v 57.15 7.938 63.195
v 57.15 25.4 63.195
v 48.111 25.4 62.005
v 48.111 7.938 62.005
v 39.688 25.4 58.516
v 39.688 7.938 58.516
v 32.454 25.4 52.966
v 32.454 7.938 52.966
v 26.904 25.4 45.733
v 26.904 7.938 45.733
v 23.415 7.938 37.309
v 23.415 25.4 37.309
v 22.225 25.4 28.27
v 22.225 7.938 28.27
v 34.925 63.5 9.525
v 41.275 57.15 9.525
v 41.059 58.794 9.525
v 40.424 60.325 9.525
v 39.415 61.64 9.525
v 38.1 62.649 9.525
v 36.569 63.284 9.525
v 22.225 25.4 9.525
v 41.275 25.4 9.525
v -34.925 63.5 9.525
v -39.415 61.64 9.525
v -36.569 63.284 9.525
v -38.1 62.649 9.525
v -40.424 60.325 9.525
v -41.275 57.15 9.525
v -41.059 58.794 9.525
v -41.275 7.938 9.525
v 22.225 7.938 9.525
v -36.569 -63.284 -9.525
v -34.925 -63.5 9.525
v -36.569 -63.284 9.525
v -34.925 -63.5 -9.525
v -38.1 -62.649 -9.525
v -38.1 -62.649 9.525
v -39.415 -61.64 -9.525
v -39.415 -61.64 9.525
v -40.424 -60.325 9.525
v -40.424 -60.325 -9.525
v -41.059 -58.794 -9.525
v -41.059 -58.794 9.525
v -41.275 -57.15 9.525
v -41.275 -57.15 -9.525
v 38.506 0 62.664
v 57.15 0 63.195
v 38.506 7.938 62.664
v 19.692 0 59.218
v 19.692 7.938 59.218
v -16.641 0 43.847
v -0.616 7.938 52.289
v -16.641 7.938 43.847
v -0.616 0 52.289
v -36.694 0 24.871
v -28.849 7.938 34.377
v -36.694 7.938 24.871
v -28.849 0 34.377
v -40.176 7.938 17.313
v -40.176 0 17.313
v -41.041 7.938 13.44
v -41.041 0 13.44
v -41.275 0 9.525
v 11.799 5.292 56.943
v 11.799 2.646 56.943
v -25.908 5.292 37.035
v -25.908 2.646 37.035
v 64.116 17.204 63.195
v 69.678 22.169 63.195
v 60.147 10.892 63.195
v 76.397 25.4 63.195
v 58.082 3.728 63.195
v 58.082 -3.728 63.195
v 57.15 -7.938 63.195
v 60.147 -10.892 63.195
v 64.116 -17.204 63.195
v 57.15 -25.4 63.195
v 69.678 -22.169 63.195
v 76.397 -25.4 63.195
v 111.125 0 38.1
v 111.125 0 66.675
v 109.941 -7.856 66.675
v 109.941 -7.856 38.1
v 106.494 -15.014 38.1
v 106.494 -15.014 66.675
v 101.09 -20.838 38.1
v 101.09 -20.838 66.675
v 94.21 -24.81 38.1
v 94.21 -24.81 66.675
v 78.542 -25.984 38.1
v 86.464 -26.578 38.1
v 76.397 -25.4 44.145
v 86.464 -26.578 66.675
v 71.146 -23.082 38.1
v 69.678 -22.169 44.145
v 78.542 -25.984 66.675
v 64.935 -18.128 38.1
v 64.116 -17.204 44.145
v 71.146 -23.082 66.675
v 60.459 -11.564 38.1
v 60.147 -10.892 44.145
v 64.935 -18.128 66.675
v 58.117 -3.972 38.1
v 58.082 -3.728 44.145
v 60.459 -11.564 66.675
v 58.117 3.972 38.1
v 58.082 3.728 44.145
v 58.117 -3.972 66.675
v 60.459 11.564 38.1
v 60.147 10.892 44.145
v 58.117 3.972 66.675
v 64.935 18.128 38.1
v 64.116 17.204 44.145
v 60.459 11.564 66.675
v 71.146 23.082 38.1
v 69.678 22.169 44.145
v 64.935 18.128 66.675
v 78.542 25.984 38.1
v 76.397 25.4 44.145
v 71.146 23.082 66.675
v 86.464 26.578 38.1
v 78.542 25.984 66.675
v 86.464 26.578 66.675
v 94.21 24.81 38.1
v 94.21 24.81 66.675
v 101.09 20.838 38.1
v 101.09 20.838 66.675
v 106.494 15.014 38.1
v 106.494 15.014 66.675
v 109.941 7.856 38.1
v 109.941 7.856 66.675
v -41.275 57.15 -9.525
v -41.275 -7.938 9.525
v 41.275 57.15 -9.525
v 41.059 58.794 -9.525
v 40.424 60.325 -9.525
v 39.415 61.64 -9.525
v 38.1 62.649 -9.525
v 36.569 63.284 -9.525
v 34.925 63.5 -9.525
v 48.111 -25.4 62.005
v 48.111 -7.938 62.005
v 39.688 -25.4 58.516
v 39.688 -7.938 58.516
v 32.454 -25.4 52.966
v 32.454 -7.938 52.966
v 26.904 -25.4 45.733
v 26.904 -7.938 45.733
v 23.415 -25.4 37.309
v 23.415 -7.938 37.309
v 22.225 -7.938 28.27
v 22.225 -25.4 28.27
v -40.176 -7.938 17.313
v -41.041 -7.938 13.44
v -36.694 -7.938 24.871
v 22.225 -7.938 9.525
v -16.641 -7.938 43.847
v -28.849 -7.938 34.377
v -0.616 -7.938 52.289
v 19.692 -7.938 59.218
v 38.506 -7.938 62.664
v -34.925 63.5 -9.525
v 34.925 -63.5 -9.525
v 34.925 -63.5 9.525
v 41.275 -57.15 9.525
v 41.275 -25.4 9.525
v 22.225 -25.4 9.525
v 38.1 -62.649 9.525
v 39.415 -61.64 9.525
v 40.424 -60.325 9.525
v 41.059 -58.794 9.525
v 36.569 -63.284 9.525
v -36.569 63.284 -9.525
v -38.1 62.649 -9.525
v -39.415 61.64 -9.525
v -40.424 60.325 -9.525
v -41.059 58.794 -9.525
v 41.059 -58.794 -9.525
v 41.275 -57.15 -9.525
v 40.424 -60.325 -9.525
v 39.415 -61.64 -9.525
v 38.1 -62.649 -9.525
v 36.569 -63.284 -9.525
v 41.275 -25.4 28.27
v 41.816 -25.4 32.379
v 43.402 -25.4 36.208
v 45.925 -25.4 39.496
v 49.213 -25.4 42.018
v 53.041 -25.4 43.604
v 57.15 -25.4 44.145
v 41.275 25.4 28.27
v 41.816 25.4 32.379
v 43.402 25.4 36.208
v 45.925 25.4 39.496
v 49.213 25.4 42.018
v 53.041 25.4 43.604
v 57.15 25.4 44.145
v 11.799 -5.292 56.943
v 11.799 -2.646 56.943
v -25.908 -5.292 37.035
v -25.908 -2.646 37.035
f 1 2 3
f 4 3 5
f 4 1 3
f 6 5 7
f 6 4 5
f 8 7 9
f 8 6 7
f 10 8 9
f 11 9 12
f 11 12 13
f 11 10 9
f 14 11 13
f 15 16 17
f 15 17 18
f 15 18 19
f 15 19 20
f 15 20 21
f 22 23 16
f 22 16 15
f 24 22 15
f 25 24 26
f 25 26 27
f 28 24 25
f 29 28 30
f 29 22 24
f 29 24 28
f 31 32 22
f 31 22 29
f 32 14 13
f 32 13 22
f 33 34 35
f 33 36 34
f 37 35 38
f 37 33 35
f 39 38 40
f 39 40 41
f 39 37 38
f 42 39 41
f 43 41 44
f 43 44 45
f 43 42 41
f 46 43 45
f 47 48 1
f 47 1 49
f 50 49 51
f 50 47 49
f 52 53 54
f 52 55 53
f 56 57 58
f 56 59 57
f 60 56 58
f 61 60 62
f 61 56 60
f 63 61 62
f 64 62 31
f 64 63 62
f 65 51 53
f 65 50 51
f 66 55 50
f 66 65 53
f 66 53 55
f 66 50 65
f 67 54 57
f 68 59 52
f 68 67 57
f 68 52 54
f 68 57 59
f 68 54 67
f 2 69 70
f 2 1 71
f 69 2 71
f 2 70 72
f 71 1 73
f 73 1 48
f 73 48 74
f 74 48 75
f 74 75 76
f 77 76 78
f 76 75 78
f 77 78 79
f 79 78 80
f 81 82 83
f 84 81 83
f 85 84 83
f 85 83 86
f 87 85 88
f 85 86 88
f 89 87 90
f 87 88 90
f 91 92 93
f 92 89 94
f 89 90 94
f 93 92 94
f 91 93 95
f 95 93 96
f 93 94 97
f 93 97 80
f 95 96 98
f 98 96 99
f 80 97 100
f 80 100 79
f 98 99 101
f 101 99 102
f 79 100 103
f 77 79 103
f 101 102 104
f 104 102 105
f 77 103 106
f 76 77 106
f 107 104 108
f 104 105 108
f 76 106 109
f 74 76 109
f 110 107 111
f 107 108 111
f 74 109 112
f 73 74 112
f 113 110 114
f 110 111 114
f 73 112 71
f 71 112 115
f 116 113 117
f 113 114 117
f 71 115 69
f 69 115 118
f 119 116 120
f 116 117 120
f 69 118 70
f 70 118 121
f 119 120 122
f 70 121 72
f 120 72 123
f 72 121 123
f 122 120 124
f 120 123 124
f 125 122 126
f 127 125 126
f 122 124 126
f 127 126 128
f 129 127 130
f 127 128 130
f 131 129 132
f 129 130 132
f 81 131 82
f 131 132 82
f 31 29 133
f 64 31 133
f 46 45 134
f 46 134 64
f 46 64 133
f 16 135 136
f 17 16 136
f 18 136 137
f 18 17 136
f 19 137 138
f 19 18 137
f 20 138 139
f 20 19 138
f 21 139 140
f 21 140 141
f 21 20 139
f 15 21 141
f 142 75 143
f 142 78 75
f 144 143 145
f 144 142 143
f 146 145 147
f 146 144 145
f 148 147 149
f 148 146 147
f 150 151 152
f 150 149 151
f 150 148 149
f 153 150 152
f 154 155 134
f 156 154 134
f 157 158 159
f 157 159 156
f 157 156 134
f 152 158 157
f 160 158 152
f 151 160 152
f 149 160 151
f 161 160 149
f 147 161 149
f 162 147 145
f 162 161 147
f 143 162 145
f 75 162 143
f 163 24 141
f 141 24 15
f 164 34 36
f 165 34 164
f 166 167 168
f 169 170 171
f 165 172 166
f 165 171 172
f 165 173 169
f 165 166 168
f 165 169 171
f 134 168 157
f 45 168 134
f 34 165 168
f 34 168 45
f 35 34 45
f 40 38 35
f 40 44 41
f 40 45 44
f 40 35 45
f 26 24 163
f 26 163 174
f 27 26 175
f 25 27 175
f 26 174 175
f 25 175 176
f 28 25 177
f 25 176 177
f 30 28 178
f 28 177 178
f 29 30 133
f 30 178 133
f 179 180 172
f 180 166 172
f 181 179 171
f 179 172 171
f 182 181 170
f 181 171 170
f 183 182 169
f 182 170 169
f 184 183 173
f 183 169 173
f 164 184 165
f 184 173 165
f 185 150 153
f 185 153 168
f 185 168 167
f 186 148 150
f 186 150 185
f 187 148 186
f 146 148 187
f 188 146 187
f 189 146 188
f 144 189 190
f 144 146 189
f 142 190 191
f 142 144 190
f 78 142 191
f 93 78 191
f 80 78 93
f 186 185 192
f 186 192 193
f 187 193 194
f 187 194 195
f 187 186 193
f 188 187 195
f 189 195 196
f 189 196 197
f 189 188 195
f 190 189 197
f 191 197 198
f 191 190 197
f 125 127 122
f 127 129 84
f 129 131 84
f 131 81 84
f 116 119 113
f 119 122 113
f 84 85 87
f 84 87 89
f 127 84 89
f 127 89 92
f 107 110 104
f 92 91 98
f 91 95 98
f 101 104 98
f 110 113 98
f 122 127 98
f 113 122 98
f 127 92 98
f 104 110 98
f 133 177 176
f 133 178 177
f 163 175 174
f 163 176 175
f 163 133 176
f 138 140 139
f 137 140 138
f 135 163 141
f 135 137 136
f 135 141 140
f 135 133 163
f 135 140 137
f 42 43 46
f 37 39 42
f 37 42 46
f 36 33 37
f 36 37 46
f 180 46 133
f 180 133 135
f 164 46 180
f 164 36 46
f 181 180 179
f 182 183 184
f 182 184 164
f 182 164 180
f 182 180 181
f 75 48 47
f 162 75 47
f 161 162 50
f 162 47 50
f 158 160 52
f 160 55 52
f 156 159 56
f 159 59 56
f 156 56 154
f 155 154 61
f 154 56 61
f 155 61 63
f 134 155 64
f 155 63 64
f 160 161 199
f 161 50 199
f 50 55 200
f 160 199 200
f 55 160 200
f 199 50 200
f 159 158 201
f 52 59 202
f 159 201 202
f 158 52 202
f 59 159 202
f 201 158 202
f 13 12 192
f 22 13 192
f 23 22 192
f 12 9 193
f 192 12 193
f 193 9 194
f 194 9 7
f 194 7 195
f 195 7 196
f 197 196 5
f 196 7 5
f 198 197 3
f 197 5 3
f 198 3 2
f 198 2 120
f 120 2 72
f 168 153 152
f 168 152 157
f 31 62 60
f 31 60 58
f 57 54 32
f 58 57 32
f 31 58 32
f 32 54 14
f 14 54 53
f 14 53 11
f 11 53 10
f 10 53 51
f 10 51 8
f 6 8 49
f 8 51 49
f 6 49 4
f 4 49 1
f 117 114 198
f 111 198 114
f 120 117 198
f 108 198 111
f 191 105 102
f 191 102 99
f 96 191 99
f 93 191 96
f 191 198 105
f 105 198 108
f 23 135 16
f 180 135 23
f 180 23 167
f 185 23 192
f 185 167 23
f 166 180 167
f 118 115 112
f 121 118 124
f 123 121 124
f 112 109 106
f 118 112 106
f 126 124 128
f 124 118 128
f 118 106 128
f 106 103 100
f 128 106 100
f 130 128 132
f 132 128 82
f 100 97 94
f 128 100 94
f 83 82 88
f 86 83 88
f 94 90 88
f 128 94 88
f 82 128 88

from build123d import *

# Parameters (mm, degrees)
F1_DEPTH = 63.5
F2_DEPTH = 25.4
F3_DEPTH = 7.9375
F0_W     = 24.147347727
F0_H     = 19.05
F4_DEPTH = 25.4
F6_R     = 6.35


with BuildPart() as f1:
    # F0 (on Front) → F1 (new body, symmetric)
    with BuildSketch(Plane.XZ):
        Polygon((-41.275, 9.525), (-41.275, -9.525), (41.275, -9.525), (41.275, 9.525), (22.225, 9.525), align=None)
    extrude(amount=F1_DEPTH, both=True)

    # F0 (on Front) → F2 (join, symmetric)
    with BuildSketch(Plane.XZ):
        with BuildLine():
            Line((22.225, 9.525), (41.275, 9.525))
            Line((41.275, 9.525), (41.275, 28.2702))
            ThreePointArc((41.275, 28.2702), (45.9246798487, 39.4955201513), (57.15, 44.1452))
            Line((57.15, 44.1452), (60.325, 44.1452))
            Line((60.325, 44.1452), (60.325, 63.1952))
            Line((60.325, 63.1952), (57.15, 63.1952))
            ThreePointArc((57.15, 63.1952), (32.4542956671, 52.9659043329), (22.225, 28.2702))
            Line((22.225, 28.2702), (22.225, 9.525))
        make_face()
    extrude(amount=F2_DEPTH, both=True)

    # F0 (on Front) → F3 (join, symmetric)
    with BuildSketch(Plane.XZ):
        with BuildLine():
            add(Edge.make_bspline(
                [(57.15, 63.1952), (12.8750428557, 65.7868459821), (-41.9757738709, 38.8200096786), (-41.275, 9.525)],
                knots=[0, 0, 0, 0, 112.1069622862, 112.1069622862, 112.1069622862, 112.1069622862], degree=3))
            Line((-41.275, 9.525), (22.225, 9.525))
            Line((22.225, 9.525), (22.225, 28.2702))
            ThreePointArc((22.225, 28.2702), (32.4542956671, 52.9659043329), (57.15, 63.1952))
        make_face()
    extrude(amount=F3_DEPTH, both=True)

    # F0 (on Front) → F4 (join, symmetric)
    with BuildSketch(Plane.XZ):
        with Locations((72.3986738635, 53.6702)):
            Rectangle(F0_W, F0_H)
    extrude(amount=F4_DEPTH, both=True)

    # F0 (on Front) → F5 (revolve)
    with BuildSketch(Plane.XZ):
        Polygon((84.472347727, 66.675), (84.472347727, 63.1952), (84.472347727, 44.1452), (84.472347727, 38.1), (111.125, 38.1), (111.125, 66.675), align=None)
    revolve(axis=Axis((84.472347727, 0, 52.3875), (0, 0, -1)))

    # F6
    f6_edges = [f1.edges().sort_by_distance(p)[0] for p in [
        (-41.275, -63.5, 0),
        (41.275, -63.5, 0),
        (-41.275, 63.5, 0),
        (41.275, 63.5, 0),
    ]]
    fillet(f6_edges, radius=F6_R)


solid = f1.part
